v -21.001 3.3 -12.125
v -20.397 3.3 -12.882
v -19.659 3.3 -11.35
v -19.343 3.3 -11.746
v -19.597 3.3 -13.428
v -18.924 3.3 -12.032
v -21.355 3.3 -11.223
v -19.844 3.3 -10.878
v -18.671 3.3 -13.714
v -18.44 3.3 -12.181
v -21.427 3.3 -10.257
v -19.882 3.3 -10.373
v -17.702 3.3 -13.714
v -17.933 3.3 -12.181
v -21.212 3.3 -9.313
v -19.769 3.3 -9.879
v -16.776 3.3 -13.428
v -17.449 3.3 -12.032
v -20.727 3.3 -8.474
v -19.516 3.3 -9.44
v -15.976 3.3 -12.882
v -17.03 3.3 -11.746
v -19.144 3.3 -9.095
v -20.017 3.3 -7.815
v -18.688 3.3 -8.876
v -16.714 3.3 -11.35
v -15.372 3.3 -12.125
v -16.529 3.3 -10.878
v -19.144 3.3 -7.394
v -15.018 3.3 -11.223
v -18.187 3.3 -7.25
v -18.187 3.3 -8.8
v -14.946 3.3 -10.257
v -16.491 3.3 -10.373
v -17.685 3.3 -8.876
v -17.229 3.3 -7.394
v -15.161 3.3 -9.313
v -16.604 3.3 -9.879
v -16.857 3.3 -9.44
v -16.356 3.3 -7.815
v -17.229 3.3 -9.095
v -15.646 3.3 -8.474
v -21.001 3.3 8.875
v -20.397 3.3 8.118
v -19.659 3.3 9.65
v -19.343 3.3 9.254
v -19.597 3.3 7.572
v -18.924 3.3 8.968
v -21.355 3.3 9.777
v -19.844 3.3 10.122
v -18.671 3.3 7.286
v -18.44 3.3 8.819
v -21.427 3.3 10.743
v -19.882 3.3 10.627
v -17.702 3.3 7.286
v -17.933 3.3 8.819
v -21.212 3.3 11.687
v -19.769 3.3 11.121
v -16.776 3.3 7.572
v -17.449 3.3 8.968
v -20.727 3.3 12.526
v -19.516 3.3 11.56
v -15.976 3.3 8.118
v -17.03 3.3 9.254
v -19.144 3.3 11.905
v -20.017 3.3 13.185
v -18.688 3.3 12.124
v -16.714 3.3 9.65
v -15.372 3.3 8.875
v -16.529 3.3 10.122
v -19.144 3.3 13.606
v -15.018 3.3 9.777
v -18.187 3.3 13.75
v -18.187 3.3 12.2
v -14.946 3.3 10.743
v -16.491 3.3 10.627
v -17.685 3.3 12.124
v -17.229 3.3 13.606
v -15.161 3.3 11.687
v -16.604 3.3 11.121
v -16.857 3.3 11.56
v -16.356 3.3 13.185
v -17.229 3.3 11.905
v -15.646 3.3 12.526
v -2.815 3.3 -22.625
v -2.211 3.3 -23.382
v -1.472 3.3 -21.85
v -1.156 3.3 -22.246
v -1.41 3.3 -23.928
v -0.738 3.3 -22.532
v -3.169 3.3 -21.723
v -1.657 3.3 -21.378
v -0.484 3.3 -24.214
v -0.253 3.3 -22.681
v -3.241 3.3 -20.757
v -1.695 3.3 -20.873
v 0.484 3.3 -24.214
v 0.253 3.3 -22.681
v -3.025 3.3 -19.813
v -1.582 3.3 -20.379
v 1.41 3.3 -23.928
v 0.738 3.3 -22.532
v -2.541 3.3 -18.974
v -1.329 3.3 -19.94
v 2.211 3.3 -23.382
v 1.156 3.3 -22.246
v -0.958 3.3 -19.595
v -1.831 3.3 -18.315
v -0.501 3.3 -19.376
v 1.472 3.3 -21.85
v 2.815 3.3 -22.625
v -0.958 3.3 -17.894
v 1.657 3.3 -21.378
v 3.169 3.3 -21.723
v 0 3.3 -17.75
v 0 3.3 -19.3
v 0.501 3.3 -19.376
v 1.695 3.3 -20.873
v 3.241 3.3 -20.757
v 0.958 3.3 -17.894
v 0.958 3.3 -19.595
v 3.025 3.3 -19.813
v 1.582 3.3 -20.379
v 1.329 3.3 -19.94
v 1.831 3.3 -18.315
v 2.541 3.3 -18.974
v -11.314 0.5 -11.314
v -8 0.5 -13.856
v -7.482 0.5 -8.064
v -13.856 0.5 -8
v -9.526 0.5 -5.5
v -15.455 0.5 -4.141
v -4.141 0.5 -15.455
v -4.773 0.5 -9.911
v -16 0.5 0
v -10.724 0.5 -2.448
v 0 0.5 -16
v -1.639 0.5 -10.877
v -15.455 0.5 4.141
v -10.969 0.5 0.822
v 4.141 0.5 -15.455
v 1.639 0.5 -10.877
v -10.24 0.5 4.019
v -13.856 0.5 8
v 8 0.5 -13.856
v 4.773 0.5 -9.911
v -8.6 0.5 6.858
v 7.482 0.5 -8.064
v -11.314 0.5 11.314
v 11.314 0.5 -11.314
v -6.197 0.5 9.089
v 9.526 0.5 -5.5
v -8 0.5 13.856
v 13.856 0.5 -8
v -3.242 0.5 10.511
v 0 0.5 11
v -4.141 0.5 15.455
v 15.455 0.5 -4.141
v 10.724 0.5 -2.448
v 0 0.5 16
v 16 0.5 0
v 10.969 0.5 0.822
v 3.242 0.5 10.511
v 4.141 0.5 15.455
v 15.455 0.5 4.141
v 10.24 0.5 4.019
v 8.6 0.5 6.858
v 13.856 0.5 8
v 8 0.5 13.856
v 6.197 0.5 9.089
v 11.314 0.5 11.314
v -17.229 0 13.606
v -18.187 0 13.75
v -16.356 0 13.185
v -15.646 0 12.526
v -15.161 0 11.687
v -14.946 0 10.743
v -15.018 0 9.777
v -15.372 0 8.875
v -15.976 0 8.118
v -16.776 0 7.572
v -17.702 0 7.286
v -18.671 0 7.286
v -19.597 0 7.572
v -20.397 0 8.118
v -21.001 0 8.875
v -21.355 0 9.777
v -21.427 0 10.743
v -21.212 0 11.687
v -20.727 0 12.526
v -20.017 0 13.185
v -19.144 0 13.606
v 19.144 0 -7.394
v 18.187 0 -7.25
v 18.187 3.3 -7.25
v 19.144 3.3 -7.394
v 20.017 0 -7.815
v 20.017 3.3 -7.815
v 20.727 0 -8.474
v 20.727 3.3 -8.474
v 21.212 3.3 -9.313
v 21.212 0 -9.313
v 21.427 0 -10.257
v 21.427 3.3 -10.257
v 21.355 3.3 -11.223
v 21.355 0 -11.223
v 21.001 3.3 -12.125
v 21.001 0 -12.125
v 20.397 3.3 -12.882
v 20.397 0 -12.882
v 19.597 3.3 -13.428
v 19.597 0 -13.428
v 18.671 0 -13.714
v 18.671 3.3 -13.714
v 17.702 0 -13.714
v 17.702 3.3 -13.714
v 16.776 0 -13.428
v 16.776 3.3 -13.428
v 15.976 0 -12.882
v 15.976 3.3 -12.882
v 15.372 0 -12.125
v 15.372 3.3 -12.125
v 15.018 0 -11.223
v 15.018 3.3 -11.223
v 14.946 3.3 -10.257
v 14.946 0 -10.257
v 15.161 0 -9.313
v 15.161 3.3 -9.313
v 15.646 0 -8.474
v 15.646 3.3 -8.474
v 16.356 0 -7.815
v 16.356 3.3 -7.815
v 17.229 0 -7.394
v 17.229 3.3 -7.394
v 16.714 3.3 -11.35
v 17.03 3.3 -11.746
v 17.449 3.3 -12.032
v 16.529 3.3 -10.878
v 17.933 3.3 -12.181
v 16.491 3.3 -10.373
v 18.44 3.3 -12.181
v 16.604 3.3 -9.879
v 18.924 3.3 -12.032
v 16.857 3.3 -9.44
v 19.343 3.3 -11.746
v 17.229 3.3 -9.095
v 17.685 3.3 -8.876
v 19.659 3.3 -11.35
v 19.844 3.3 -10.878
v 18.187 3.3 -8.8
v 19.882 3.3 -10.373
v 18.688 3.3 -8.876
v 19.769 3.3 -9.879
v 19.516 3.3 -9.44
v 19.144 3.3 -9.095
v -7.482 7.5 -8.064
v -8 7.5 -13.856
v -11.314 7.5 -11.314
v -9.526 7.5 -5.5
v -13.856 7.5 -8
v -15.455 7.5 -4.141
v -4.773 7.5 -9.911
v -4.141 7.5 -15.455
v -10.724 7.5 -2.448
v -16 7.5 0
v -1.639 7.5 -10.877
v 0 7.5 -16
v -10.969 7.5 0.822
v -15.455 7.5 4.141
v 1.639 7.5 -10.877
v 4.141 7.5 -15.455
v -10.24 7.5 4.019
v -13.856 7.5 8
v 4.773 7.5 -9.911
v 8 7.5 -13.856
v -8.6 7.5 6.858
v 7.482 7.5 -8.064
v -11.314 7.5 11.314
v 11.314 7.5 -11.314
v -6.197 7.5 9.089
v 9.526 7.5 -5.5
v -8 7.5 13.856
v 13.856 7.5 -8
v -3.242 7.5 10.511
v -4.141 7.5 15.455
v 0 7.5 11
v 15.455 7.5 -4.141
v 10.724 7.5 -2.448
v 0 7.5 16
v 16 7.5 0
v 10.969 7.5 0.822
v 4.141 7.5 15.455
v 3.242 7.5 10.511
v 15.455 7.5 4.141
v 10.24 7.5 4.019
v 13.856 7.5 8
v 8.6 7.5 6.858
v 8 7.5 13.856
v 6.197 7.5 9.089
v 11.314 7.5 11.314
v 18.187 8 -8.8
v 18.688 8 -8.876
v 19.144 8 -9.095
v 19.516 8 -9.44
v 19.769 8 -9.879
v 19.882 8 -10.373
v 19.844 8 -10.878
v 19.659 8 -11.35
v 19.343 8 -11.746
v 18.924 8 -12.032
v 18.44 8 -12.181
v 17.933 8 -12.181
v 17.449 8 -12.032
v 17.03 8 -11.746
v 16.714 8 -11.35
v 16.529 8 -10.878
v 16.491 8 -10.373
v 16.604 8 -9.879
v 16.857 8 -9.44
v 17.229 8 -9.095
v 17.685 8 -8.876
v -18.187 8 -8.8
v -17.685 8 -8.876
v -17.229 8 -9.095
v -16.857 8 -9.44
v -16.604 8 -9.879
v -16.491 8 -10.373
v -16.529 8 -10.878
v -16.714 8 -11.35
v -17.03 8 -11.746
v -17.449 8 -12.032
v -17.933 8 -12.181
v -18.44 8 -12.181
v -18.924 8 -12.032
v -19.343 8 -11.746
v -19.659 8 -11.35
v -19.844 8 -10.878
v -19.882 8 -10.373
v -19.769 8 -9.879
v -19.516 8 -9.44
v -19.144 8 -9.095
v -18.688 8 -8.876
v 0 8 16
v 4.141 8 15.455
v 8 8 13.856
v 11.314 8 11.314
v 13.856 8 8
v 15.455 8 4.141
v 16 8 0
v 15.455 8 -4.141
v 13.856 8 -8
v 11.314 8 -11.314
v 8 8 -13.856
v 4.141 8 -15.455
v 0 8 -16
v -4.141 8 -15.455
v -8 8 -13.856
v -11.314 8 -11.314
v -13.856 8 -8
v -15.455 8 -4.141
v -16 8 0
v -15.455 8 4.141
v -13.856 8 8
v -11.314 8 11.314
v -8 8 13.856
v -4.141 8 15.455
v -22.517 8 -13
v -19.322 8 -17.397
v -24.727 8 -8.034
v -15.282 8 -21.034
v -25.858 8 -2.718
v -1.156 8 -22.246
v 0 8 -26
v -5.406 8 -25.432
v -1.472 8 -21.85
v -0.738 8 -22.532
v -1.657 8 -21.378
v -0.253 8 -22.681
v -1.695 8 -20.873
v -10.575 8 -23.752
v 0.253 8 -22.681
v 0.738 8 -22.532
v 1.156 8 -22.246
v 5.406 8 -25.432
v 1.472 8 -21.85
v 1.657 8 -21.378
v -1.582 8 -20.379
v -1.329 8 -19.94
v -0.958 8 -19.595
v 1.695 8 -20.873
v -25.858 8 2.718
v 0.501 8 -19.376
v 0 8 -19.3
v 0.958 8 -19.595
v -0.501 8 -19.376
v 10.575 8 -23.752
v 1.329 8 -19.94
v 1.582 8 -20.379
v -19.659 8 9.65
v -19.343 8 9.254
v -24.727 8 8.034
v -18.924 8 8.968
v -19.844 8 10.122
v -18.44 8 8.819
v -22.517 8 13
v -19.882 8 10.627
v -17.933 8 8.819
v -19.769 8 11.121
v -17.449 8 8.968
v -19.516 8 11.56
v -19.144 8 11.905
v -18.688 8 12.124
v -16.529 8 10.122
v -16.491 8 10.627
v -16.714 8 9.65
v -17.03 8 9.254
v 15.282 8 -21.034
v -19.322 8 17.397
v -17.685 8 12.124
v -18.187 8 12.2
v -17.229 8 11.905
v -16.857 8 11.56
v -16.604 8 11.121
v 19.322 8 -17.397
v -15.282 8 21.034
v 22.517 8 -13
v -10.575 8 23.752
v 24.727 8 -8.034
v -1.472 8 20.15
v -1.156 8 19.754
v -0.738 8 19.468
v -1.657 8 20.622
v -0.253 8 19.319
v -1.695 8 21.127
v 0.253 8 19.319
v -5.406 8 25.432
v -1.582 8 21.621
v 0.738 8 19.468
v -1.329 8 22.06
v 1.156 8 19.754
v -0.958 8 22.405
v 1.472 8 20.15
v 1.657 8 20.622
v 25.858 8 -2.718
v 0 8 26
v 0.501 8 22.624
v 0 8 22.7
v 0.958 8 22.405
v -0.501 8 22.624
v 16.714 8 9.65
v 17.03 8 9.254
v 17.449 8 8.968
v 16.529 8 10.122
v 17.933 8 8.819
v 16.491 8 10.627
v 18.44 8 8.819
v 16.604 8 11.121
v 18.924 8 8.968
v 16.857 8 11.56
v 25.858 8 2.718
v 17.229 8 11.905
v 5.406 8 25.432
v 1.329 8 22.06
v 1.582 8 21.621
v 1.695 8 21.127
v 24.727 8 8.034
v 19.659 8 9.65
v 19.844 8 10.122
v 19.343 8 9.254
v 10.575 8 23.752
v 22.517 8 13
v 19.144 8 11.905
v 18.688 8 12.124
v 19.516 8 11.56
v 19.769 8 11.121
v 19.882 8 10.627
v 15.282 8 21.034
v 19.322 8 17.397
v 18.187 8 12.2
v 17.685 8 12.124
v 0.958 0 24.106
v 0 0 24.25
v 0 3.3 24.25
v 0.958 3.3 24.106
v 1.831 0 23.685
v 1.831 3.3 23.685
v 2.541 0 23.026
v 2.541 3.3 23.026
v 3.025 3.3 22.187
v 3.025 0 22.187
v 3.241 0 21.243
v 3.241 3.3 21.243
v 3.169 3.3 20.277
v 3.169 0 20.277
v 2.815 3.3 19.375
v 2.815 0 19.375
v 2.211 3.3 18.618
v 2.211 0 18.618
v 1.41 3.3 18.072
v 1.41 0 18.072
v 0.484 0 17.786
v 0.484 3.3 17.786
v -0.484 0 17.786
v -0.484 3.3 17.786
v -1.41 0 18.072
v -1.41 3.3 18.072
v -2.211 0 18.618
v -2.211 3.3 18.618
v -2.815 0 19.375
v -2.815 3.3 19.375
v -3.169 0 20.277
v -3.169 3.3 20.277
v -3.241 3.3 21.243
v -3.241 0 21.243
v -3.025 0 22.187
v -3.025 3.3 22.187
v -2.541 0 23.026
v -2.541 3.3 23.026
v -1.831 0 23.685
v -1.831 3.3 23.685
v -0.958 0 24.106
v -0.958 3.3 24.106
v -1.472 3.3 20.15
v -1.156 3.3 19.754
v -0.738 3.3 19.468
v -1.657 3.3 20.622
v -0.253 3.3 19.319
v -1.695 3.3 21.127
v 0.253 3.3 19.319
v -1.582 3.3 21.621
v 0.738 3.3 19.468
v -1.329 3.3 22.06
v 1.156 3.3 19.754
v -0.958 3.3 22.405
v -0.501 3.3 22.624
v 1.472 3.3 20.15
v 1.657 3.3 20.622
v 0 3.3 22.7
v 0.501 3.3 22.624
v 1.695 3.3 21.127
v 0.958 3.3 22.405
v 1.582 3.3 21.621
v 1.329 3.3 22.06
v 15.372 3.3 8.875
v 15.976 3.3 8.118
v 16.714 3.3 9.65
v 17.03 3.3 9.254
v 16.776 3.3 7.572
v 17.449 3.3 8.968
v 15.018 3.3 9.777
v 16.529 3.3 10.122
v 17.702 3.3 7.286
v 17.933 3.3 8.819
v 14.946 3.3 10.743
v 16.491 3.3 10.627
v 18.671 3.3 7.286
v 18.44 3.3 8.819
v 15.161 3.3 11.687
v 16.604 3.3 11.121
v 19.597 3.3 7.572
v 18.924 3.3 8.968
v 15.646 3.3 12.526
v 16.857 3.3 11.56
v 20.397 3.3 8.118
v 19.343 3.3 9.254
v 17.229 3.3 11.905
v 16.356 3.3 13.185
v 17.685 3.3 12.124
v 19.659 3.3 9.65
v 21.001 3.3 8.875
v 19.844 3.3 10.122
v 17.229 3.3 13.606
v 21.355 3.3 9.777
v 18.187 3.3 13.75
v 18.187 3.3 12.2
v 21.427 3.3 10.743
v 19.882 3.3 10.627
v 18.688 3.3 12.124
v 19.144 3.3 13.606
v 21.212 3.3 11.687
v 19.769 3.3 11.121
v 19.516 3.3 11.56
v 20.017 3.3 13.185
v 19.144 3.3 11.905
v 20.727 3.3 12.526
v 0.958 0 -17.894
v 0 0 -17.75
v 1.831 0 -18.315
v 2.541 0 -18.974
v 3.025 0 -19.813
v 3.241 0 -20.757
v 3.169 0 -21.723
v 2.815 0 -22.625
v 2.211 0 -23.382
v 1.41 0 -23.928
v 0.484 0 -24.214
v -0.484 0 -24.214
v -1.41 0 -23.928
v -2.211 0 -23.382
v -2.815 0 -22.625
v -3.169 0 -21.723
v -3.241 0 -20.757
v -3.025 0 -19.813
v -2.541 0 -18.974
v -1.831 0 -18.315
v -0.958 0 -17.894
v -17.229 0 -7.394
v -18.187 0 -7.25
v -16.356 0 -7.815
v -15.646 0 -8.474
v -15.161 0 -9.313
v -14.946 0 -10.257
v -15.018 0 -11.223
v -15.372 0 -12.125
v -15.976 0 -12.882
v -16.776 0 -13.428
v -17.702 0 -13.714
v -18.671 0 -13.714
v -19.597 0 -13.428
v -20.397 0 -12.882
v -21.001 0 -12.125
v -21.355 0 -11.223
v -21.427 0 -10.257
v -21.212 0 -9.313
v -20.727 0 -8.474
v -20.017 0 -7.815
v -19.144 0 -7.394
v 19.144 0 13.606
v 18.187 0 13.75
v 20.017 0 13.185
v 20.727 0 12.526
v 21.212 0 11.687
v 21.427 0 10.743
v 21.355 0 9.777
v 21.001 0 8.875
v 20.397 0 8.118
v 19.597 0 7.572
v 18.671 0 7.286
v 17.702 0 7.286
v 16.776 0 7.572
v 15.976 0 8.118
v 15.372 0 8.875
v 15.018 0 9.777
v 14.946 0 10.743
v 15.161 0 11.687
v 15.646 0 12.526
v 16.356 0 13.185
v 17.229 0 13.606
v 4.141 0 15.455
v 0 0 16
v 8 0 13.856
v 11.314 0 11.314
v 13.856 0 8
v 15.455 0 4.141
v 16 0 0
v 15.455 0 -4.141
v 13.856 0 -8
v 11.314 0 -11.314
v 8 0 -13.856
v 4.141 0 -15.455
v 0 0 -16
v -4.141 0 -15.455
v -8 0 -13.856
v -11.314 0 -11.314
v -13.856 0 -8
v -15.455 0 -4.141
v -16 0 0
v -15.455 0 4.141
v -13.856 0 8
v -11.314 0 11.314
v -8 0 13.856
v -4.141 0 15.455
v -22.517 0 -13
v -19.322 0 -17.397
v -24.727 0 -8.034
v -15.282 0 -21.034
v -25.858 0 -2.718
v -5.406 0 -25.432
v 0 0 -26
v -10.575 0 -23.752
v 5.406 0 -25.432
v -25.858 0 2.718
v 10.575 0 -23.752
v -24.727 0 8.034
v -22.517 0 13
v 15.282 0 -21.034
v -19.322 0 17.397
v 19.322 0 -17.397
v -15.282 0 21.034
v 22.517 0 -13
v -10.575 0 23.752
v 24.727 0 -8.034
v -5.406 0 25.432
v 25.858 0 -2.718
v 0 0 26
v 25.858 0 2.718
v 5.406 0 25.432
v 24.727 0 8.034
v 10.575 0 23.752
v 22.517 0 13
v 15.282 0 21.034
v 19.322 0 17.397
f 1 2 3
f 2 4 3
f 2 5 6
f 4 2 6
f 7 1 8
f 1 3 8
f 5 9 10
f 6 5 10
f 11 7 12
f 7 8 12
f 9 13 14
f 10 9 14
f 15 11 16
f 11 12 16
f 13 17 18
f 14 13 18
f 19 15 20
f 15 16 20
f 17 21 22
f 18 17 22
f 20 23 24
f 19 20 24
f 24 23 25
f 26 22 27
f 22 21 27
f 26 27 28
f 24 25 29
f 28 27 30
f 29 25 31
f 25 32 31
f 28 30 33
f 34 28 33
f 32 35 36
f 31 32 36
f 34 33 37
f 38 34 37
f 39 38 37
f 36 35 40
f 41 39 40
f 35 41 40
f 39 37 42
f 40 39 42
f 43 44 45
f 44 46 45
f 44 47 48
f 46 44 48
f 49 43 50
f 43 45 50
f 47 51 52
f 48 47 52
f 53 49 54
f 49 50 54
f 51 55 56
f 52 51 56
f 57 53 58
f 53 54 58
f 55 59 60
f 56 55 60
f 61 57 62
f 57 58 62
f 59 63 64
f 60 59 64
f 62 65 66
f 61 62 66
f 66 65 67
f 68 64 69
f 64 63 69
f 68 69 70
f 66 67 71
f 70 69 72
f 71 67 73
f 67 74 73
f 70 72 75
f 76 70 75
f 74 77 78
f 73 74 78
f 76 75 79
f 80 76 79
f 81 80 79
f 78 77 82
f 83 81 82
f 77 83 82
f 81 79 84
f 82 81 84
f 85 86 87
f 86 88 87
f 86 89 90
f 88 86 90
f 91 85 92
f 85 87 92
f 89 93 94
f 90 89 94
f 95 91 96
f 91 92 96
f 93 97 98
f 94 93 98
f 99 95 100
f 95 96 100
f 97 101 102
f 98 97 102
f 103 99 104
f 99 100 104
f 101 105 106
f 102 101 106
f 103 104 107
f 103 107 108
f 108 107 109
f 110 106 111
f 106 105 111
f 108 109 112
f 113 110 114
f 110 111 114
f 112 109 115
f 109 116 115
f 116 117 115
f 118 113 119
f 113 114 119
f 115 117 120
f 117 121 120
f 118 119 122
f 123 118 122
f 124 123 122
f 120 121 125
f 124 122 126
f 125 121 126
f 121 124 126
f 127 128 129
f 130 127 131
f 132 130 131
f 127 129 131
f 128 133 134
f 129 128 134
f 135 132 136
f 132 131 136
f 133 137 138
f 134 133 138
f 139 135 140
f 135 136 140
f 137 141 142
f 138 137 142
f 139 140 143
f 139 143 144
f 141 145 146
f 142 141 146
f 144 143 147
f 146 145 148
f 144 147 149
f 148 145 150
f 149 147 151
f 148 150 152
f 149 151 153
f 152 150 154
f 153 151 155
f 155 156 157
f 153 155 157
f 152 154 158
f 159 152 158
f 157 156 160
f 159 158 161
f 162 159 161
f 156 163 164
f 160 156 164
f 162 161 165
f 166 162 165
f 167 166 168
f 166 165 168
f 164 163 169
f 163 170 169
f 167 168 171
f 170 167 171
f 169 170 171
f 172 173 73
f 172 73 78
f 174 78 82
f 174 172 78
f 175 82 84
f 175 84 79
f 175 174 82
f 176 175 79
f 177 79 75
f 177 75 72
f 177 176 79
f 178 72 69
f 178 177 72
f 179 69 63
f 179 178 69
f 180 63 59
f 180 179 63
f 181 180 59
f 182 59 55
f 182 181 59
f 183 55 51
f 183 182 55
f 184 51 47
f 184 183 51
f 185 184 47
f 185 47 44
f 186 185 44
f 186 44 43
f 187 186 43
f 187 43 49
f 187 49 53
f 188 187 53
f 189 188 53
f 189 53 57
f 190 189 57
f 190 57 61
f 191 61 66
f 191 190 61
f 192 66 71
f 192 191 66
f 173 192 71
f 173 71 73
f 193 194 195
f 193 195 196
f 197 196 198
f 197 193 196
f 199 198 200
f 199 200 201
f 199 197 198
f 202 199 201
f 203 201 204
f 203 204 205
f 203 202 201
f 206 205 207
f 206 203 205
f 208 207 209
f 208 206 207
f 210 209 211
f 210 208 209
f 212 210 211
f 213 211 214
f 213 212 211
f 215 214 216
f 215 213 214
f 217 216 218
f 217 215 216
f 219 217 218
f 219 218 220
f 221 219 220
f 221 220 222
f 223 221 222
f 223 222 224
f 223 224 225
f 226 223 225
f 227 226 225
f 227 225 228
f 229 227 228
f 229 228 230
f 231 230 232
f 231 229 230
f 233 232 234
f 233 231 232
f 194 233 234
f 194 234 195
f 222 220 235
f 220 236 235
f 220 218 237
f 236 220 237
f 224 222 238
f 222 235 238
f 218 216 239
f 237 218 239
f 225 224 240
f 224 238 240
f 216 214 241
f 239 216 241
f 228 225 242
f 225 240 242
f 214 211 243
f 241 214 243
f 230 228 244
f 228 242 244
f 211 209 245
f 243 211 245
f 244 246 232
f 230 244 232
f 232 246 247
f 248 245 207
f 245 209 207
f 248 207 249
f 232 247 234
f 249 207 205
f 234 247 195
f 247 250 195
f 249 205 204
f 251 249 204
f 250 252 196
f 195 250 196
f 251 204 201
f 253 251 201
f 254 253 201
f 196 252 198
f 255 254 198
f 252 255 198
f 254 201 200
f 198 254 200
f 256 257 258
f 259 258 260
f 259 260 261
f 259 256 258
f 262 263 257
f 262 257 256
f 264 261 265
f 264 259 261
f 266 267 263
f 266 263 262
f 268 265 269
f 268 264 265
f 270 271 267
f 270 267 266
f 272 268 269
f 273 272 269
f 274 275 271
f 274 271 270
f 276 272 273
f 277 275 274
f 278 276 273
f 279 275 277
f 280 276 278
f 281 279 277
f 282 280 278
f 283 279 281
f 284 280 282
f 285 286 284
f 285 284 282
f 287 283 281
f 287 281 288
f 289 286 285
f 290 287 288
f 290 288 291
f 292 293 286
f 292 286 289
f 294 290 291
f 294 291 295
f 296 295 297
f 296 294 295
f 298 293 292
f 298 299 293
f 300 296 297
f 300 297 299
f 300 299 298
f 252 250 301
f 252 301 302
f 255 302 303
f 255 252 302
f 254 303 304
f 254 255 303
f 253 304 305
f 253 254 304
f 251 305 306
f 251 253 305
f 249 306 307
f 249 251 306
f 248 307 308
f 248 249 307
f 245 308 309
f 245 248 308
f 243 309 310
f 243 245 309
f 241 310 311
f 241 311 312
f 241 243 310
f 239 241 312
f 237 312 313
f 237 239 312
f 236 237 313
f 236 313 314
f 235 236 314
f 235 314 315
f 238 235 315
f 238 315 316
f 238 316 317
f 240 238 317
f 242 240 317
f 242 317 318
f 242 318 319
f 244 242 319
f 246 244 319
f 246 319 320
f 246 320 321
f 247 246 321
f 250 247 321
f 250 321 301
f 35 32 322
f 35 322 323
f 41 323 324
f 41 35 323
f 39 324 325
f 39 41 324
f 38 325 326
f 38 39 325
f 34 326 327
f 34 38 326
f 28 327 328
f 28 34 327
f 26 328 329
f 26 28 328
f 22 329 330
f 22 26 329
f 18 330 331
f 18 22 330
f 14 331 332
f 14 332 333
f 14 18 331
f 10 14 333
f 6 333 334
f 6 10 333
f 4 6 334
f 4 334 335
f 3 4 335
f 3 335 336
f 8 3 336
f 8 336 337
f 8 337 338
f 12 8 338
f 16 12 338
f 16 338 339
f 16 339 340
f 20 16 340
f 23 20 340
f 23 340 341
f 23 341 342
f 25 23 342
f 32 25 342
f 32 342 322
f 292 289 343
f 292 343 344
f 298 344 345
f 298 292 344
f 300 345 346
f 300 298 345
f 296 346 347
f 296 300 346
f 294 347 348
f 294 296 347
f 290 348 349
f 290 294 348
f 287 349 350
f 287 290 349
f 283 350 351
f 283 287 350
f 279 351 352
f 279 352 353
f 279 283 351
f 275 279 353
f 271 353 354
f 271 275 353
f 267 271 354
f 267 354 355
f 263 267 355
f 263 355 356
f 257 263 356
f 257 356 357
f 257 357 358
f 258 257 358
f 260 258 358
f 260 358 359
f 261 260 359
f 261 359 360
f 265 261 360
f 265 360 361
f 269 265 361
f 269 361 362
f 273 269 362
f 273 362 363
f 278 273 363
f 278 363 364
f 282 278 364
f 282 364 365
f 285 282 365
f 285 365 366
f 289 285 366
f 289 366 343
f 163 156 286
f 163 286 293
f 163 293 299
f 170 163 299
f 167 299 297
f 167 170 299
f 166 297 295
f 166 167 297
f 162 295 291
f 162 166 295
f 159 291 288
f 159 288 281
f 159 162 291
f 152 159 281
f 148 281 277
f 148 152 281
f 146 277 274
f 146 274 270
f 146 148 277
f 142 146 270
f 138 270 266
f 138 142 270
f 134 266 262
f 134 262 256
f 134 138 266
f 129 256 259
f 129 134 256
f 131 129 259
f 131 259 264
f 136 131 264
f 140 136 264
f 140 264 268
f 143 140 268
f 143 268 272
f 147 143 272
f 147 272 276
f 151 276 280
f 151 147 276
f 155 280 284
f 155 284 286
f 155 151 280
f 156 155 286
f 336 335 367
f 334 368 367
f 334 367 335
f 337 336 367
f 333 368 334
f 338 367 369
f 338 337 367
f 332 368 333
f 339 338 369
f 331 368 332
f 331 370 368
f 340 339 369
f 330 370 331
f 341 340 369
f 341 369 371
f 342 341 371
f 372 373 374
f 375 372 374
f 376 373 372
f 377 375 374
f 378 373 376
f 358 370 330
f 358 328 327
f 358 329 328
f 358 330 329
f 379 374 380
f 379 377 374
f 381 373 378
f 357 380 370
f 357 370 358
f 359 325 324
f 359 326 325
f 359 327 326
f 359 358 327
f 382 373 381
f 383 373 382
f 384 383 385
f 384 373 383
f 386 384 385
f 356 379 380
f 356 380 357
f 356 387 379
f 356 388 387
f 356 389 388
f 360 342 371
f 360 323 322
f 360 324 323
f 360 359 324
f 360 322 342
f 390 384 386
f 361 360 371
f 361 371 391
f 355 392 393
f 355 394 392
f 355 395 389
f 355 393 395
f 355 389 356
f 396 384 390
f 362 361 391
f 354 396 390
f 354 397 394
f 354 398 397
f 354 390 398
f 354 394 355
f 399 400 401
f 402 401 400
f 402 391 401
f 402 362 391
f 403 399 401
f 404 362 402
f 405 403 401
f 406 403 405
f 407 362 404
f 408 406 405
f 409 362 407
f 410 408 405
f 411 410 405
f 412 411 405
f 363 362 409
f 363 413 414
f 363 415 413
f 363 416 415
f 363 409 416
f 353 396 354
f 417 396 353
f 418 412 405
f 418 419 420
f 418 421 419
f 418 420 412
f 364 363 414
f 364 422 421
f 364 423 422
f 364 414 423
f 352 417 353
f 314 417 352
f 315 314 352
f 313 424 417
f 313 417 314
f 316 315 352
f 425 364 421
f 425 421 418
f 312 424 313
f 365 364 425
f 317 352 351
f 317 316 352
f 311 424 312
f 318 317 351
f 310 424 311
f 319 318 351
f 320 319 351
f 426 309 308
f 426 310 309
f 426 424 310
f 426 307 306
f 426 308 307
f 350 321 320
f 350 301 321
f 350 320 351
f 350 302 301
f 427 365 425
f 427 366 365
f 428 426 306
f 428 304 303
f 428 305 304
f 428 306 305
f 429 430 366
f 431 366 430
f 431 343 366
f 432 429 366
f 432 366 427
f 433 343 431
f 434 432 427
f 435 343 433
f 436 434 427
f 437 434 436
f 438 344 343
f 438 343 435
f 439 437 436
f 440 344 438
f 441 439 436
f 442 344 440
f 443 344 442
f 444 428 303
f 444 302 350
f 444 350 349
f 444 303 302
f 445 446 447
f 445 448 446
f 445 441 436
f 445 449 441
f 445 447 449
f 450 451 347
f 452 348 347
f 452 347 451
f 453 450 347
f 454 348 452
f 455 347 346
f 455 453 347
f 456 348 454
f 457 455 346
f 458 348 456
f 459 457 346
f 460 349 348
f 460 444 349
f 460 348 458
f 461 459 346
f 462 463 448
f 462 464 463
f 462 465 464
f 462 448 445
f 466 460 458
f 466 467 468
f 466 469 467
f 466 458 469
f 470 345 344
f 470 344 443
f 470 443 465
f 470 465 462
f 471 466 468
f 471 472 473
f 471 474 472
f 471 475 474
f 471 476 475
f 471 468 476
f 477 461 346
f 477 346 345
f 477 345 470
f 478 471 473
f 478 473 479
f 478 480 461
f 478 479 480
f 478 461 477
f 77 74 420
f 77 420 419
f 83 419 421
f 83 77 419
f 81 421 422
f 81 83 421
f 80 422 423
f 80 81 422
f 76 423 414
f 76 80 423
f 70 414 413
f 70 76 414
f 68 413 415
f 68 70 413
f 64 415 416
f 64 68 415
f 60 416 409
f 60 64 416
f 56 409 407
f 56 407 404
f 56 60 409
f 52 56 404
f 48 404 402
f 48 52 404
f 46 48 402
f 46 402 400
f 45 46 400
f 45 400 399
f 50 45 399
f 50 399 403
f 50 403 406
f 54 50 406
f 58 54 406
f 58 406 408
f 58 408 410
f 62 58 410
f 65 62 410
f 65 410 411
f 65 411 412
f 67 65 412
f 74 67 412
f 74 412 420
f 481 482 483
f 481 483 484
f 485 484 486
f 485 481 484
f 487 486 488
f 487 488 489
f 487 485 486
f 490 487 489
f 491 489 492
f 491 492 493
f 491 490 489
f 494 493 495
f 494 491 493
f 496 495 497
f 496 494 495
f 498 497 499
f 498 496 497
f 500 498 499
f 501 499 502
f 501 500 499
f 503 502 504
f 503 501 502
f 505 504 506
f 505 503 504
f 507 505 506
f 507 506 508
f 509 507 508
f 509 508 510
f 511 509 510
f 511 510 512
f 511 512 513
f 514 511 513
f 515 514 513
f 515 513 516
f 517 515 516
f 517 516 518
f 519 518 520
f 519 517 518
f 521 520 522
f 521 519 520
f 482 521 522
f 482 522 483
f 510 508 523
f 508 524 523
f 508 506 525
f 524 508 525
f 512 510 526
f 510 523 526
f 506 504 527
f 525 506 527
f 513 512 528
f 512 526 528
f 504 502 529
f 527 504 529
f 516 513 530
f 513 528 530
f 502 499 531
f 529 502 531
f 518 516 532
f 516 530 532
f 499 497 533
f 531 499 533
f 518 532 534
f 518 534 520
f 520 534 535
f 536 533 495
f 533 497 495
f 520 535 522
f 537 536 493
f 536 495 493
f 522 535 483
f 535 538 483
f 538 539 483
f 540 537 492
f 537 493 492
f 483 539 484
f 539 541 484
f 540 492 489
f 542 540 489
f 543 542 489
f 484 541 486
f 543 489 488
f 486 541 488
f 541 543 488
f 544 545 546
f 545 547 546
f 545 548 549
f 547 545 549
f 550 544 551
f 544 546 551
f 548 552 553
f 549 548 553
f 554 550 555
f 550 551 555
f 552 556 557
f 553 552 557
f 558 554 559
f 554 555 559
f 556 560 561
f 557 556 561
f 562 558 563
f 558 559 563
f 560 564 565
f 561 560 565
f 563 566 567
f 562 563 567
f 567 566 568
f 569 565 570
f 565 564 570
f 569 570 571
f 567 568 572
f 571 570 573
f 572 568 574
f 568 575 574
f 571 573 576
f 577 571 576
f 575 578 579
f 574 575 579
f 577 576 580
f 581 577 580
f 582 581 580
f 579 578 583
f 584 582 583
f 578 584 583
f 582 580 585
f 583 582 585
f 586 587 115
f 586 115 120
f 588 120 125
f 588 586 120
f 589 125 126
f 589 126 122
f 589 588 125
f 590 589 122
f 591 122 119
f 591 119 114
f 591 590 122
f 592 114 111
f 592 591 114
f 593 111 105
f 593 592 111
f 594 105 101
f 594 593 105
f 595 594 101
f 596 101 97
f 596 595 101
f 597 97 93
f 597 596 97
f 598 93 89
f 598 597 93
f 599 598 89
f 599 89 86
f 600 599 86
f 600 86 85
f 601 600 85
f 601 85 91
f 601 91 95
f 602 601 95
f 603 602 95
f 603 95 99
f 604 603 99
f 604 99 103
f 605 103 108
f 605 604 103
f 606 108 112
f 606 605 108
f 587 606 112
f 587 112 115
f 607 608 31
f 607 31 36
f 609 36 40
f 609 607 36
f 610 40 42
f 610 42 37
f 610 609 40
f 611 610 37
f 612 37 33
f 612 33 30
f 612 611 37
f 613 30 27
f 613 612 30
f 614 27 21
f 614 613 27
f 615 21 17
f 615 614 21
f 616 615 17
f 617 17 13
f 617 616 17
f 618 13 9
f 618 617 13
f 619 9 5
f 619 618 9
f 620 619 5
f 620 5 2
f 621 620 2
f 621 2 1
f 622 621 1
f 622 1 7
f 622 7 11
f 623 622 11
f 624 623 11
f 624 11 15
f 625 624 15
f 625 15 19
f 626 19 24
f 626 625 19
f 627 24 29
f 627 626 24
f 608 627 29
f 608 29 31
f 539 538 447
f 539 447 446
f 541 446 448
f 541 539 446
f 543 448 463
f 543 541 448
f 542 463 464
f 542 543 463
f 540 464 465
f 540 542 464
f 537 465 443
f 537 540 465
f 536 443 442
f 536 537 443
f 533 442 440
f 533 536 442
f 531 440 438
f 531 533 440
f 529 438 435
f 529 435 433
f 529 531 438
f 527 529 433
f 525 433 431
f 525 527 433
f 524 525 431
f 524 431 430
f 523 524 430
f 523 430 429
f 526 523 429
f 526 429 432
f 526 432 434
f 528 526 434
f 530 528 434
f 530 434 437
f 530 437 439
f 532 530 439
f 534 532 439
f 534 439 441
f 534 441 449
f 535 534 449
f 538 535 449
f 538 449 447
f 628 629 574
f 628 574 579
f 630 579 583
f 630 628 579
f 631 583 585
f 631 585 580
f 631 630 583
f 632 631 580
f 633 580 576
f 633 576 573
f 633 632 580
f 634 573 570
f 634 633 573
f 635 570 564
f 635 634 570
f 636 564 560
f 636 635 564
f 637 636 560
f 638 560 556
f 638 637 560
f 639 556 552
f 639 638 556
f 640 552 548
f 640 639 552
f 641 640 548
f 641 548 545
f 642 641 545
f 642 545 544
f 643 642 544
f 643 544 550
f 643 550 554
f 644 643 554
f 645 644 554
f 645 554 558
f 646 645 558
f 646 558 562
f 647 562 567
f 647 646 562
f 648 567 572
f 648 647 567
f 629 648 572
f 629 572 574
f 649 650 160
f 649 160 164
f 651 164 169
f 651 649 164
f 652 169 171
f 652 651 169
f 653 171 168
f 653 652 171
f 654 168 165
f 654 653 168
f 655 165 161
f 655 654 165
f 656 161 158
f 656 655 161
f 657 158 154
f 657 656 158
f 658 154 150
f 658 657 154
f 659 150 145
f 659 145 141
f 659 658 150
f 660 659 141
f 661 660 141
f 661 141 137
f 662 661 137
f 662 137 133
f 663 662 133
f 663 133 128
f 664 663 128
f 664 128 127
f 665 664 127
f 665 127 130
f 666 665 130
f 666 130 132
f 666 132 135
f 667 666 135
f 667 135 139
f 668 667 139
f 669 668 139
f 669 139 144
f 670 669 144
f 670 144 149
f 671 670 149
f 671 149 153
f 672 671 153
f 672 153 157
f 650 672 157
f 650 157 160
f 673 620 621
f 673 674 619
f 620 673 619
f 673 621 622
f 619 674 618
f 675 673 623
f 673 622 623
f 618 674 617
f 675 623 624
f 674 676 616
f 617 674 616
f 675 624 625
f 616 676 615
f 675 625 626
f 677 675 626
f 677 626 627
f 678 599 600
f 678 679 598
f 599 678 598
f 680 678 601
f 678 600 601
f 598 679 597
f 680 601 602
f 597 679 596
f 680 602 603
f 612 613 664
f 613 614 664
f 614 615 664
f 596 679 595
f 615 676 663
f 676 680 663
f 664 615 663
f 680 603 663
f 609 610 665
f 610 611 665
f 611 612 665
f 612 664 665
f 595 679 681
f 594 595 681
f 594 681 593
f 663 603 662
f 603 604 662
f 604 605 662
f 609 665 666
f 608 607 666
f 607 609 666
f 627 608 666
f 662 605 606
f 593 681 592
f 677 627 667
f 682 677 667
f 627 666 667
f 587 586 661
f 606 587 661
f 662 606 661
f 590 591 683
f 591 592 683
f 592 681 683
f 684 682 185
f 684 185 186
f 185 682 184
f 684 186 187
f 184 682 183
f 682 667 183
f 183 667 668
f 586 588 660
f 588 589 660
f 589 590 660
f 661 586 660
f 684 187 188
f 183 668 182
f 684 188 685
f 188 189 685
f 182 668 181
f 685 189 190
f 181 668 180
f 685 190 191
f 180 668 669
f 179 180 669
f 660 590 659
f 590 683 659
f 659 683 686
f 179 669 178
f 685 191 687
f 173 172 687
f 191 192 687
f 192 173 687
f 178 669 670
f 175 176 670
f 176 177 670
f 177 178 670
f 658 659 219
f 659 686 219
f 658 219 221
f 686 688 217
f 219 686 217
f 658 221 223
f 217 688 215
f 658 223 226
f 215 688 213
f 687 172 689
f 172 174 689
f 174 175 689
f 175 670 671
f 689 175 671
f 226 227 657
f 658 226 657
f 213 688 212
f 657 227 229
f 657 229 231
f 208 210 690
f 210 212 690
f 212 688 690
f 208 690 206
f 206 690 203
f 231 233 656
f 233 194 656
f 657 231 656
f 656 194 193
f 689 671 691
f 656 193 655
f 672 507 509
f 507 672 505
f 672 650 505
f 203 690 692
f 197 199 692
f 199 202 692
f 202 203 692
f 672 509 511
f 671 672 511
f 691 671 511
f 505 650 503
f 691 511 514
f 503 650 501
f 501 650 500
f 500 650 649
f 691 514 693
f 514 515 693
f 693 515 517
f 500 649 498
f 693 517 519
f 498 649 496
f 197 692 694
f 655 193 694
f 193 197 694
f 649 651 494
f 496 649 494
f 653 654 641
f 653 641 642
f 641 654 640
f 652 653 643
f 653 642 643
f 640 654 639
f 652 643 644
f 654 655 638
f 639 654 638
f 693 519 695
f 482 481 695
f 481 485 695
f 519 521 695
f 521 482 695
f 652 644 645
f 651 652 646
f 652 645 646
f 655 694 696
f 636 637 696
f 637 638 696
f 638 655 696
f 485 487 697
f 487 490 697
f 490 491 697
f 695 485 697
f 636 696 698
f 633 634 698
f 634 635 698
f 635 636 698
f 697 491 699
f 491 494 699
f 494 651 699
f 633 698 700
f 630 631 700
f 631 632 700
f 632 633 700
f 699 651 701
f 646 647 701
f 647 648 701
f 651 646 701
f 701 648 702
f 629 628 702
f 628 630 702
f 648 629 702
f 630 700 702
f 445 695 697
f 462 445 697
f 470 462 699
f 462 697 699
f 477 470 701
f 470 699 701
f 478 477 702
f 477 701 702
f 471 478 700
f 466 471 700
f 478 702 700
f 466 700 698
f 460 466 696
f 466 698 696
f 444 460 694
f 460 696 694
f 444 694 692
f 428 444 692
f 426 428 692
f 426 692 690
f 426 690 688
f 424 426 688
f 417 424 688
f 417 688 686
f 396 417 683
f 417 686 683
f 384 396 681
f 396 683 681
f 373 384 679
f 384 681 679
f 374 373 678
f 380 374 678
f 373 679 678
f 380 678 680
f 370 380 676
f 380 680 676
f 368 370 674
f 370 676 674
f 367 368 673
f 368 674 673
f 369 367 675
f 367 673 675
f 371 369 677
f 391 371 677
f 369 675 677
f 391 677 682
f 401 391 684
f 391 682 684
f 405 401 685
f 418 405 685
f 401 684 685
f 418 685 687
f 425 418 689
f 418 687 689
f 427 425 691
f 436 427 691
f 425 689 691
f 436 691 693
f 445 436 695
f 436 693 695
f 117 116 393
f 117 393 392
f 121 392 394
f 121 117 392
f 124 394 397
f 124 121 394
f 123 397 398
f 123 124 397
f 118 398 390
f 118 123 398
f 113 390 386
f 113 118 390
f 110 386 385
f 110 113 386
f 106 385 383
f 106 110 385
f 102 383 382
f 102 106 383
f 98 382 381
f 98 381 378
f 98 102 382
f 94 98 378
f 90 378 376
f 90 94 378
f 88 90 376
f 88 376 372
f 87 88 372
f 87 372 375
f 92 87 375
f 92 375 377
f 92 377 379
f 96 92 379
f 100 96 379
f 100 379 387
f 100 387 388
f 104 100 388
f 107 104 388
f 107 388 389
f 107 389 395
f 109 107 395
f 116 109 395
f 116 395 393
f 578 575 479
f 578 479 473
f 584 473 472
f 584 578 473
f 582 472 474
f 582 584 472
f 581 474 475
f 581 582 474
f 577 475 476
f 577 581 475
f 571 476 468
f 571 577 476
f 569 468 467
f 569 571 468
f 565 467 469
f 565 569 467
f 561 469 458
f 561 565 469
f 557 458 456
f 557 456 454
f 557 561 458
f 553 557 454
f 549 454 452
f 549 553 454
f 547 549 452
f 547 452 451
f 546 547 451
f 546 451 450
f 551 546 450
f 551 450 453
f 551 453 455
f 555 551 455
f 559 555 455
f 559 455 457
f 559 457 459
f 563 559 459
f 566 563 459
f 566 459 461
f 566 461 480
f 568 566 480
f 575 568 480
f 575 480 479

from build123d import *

# Parameters (mm, degrees)
SKETCH_1_R          = 26
SKETCH_1_R_2        = 1.7
SKETCH_1_R_3        = 16
EXTRUDE_1_DEPTH     = 8
SKETCH_2_R          = 3.25
CUT_EXTRUDE_1_DEPTH = 3.3
EXTRUDE_START       = 0.5
SKETCH_3_R          = 16
SKETCH_3_R_2        = 11
EXTRUDE_2_DEPTH     = 7


with BuildPart() as part:
    # 草图1 → 凸台-拉伸1 (new body)
    with BuildSketch(Plane(origin=(0, 0, 0), x_dir=(1, 0, 0), z_dir=(0, 1, 0))):
        with Locations(Location((0, 0, 0), (0, 0, 270))):
            Circle(SKETCH_1_R)
        with Locations(Location((0, 21, 0), (0, 0, 270))):
            Circle(SKETCH_1_R_2, mode=Mode.SUBTRACT)
        with Locations(Location((18.186533479, 10.5, 0), (0, 0, 270))):
            Circle(SKETCH_1_R_2, mode=Mode.SUBTRACT)
        with Locations(Location((18.186533479, -10.5, 0), (0, 0, 270))):
            Circle(SKETCH_1_R_2, mode=Mode.SUBTRACT)
        with Locations(Location((0, -21, 0), (0, 0, 270))):
            Circle(SKETCH_1_R_2, mode=Mode.SUBTRACT)
        with Locations(Location((-18.186533479, -10.5, 0), (0, 0, 270))):
            Circle(SKETCH_1_R_2, mode=Mode.SUBTRACT)
        with Locations(Location((-18.186533479, 10.5, 0), (0, 0, 270))):
            Circle(SKETCH_1_R_2, mode=Mode.SUBTRACT)
        with Locations(Location((0, 0, 0), (0, 0, 270))):
            Circle(SKETCH_1_R_3, mode=Mode.SUBTRACT)
    extrude(amount=EXTRUDE_1_DEPTH)

    # 草图2 → 切除-拉伸1 (cut)
    with BuildSketch(Plane(origin=(0, 0, 0), x_dir=(1, 0, 0), z_dir=(0, 1, 0))):
        with Locations(Location((0, 21, 0), (0, 0, 270))):
            Circle(SKETCH_2_R)
        with Locations(Location((18.186533479, 10.5, 0), (0, 0, 270))):
            Circle(SKETCH_2_R)
        with Locations(Location((18.186533479, -10.5, 0), (0, 0, 270))):
            Circle(SKETCH_2_R)
        with Locations(Location((0, -21, 0), (0, 0, 270))):
            Circle(SKETCH_2_R)
        with Locations(Location((-18.186533479, -10.5, 0), (0, 0, 270))):
            Circle(SKETCH_2_R)
        with Locations(Location((-18.186533479, 10.5, 0), (0, 0, 270))):
            Circle(SKETCH_2_R)
    extrude(amount=CUT_EXTRUDE_1_DEPTH, mode=Mode.SUBTRACT)

    # 草图3 → 凸台-拉伸2 (add)
    with BuildSketch(Plane(origin=(0, 0, 0), x_dir=(1, 0, 0), z_dir=(0, 1, 0)).offset(EXTRUDE_START)):
        with Locations(Location((0, 0, 0), (0, 0, 270))):
            Circle(SKETCH_3_R)
        with Locations(Location((0, 0, 0), (0, 0, 270))):
            Circle(SKETCH_3_R_2, mode=Mode.SUBTRACT)
    extrude(amount=EXTRUDE_2_DEPTH)


solid = part.part
